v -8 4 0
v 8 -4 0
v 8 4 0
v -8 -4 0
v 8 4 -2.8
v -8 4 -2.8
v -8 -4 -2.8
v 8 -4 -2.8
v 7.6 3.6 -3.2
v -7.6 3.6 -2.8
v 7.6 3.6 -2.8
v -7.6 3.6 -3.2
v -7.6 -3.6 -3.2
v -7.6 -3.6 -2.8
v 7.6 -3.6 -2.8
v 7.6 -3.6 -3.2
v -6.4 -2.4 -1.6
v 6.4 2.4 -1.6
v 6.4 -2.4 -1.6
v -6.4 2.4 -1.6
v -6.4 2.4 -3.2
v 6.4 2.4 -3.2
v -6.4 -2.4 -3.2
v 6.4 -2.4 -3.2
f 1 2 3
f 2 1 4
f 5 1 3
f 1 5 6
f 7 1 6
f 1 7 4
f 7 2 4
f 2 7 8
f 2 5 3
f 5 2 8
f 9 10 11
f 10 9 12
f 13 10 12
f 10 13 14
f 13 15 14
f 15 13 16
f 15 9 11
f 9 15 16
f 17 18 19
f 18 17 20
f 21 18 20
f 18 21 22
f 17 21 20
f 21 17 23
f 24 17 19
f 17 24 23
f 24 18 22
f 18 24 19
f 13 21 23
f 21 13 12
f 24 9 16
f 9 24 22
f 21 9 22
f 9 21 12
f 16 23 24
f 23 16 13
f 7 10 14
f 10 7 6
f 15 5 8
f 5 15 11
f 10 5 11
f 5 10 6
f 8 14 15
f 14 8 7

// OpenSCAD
// file: ../p/box5.scad
use <../lib.scad>
function ldraw_lib__box5() = [
// 0 Box with 5 Faces and All Edges
// 0 Name: box5.dat
// 0 Author: James Jessiman
// 0 !LDRAW_ORG Primitive UPDATE 2012-01
// 0 !LICENSE Licensed under CC BY 4.0 : see CAreadme.txt
// 
// 0 BFC CERTIFY CCW
  [0,"BFC","CERTIFY"],
  [0,"BFC","CCW"],
// 
// 0 !HISTORY 2002-04-03 [sbliss] Modified for BFC compliance
// 0 !HISTORY 2002-04-25 [PTadmin] Official Update 2002-02
// 0 !HISTORY 2007-06-24 [PTadmin] Header formatted for Contributor Agreement
// 0 !HISTORY 2008-07-01 [PTadmin] Official Update 2008-01
// 0 !HISTORY 2012-02-16 [Philo] Changed to CCW
// 0 !HISTORY 2012-03-30 [PTadmin] Official Update 2012-01
// 
// 
// 2 24 1 1 1 -1 1 1
  [2,24,1,1,1,-1,1,1],
// 2 24 -1 1 1 -1 1 -1
  [2,24,-1,1,1,-1,1,-1],
// 2 24 -1 1 -1 1 1 -1
  [2,24,-1,1,-1,1,1,-1],
// 2 24 1 1 -1 1 1 1
  [2,24,1,1,-1,1,1,1],
// 2 24 1 0 1 -1 0 1
  [2,24,1,0,1,-1,0,1],
// 2 24 -1 0 1 -1 0 -1
  [2,24,-1,0,1,-1,0,-1],
// 2 24 -1 0 -1 1 0 -1
  [2,24,-1,0,-1,1,0,-1],
// 2 24 1 0 -1 1 0 1
  [2,24,1,0,-1,1,0,1],
// 2 24 1 0 1 1 1 1
  [2,24,1,0,1,1,1,1],
// 2 24 -1 0 1 -1 1 1
  [2,24,-1,0,1,-1,1,1],
// 2 24 1 0 -1 1 1 -1
  [2,24,1,0,-1,1,1,-1],
// 2 24 -1 0 -1 -1 1 -1
  [2,24,-1,0,-1,-1,1,-1],
// 4 16 -1 1 1 1 1 1 1 1 -1 -1 1 -1
  [4,16,-1,1,1,1,1,1,1,1,-1,-1,1,-1],
// 4 16 -1 1 1 -1 0 1 1 0 1 1 1 1
  [4,16,-1,1,1,-1,0,1,1,0,1,1,1,1],
// 4 16 -1 1 -1 -1 0 -1 -1 0 1 -1 1 1
  [4,16,-1,1,-1,-1,0,-1,-1,0,1,-1,1,1],
// 4 16 1 1 -1 1 0 -1 -1 0 -1 -1 1 -1
  [4,16,1,1,-1,1,0,-1,-1,0,-1,-1,1,-1],
// 4 16 1 1 1 1 0 1 1 0 -1 1 1 -1
  [4,16,1,1,1,1,0,1,1,0,-1,1,1,-1],
];
module ldraw_lib__box5(step=0, col=false, unit=2/5, alt=false, line=0.2, solid=!$preview)
    makepoly(ldraw_lib__box5(), step=step, col=col, unit=unit, alt=alt, line=line, solid=solid);
ldraw_lib__box5(line=0.2);
// file: ../p/box4.scad
use <../lib.scad>
function ldraw_lib__box4() = [
// 0 Box with 4 Faces (2 Parallel Pairs) and All Edges
// 0 Name: box4.dat
// 0 Author: James Jessiman
// 0 !LDRAW_ORG Primitive UPDATE 2012-01
// 0 !LICENSE Licensed under CC BY 4.0 : see CAreadme.txt
// 
// 0 BFC CERTIFY CCW
  [0,"BFC","CERTIFY"],
  [0,"BFC","CCW"],
// 
// 0 !HISTORY 2002-04-03 [sbliss] Modified for BFC compliance
// 0 !HISTORY 2002-04-25 [PTadmin] Official Update 2002-02
// 0 !HISTORY 2007-06-24 [PTadmin] Header formatted for Contributor Agreement
// 0 !HISTORY 2008-07-01 [PTadmin] Official Update 2008-01
// 0 !HISTORY 2012-02-16 [Philo] Changed to CCW
// 0 !HISTORY 2012-03-30 [PTadmin] Official Update 2012-01
// 
// 
// 2 24 1 1 1 -1 1 1
  [2,24,1,1,1,-1,1,1],
// 2 24 -1 1 1 -1 1 -1
  [2,24,-1,1,1,-1,1,-1],
// 2 24 -1 1 -1 1 1 -1
  [2,24,-1,1,-1,1,1,-1],
// 2 24 1 1 -1 1 1 1
  [2,24,1,1,-1,1,1,1],
// 2 24 1 0 1 -1 0 1
  [2,24,1,0,1,-1,0,1],
// 2 24 -1 0 1 -1 0 -1
  [2,24,-1,0,1,-1,0,-1],
// 2 24 -1 0 -1 1 0 -1
  [2,24,-1,0,-1,1,0,-1],
// 2 24 1 0 -1 1 0 1
  [2,24,1,0,-1,1,0,1],
// 2 24 1 0 1 1 1 1
  [2,24,1,0,1,1,1,1],
// 2 24 -1 0 1 -1 1 1
  [2,24,-1,0,1,-1,1,1],
// 2 24 1 0 -1 1 1 -1
  [2,24,1,0,-1,1,1,-1],
// 2 24 -1 0 -1 -1 1 -1
  [2,24,-1,0,-1,-1,1,-1],
// 4 16 -1 1 1 -1 0 1 1 0 1 1 1 1
  [4,16,-1,1,1,-1,0,1,1,0,1,1,1,1],
// 4 16 -1 1 -1 -1 0 -1 -1 0 1 -1 1 1
  [4,16,-1,1,-1,-1,0,-1,-1,0,1,-1,1,1],
// 4 16 1 1 -1 1 0 -1 -1 0 -1 -1 1 -1
  [4,16,1,1,-1,1,0,-1,-1,0,-1,-1,1,-1],
// 4 16 1 1 1 1 0 1 1 0 -1 1 1 -1
  [4,16,1,1,1,1,0,1,1,0,-1,1,1,-1],
];
module ldraw_lib__box4(step=0, col=false, unit=2/5, alt=false, line=0.2, solid=!$preview)
    makepoly(ldraw_lib__box4(), step=step, col=col, unit=unit, alt=alt, line=line, solid=solid);
ldraw_lib__box4(line=0.2);
// file: s/3069bs01.scad
use <../../lib.scad>
use <../../p/box4.scad>
use <../../p/box5.scad>
function ldraw_lib__s__3069bs01() = [
// 0 ~Tile  1 x  2 with Groove without Top Face
// 0 Name: s\3069bs01.dat
// 0 Author: Santeri Piippo [arezey]
// 0 !LDRAW_ORG Subpart UPDATE 2010-02
// 0 !LICENSE Licensed under CC BY 4.0 : see CAreadme.txt
// 
// 0 BFC CERTIFY CCW
  [0,"BFC","CERTIFY"],
  [0,"BFC","CCW"],
// 
// 0 !HISTORY 2010-07-05 [PTadmin] Official Update 2010-02
// 
// 
// 1 16 0 0 0 20 0 0 0 7 0 0 0 10 box4.dat
  [1,16,0,0,0,20,0,0,0,7,0,0,0,10, ldraw_lib__box4()],
// 1 16 0 7 0 19 0 0 0 1 0 0 0 9 box4.dat
  [1,16,0,7,0,19,0,0,0,1,0,0,0,9, ldraw_lib__box4()],
// 0 BFC INVERTNEXT
  [0,"BFC","INVERTNEXT"],
// 1 16 0 8 0 16 0 0 0 -4 0 0 0 6 box5.dat
  [1,16,0,8,0,16,0,0,0,-4,0,0,0,6, ldraw_lib__box5()],
// 4 16 -19 8 9 -16 8 6 -16 8 -6 -19 8 -9
  [4,16,-19,8,9,-16,8,6,-16,8,-6,-19,8,-9],
// 4 16 19 8 -9 16 8 -6 16 8 6 19 8 9
  [4,16,19,8,-9,16,8,-6,16,8,6,19,8,9],
// 4 16 19 8 9 16 8 6 -16 8 6 -19 8 9
  [4,16,19,8,9,16,8,6,-16,8,6,-19,8,9],
// 4 16 -19 8 -9 -16 8 -6 16 8 -6 19 8 -9
  [4,16,-19,8,-9,-16,8,-6,16,8,-6,19,8,-9],
// 4 16 -20 7 10 -19 7 9 -19 7 -9 -20 7 -10
  [4,16,-20,7,10,-19,7,9,-19,7,-9,-20,7,-10],
// 4 16 20 7 -10 19 7 -9 19 7 9 20 7 10
  [4,16,20,7,-10,19,7,-9,19,7,9,20,7,10],
// 4 16 20 7 10 19 7 9 -19 7 9 -20 7 10
  [4,16,20,7,10,19,7,9,-19,7,9,-20,7,10],
// 4 16 -20 7 -10 -19 7 -9 19 7 -9 20 7 -10
  [4,16,-20,7,-10,-19,7,-9,19,7,-9,20,7,-10],
// 0 //
];
module ldraw_lib__s__3069bs01(step=0, col=false, unit=2/5, alt=false, line=0.2, solid=!$preview)
    makepoly(ldraw_lib__s__3069bs01(), step=step, col=col, unit=unit, alt=alt, line=line, solid=solid);
ldraw_lib__s__3069bs01(line=0.2);
// main file
use <../lib.scad>
use <s/3069bs01.scad>
function ldraw_lib__3069b() = [
// 0 Tile  1 x  2 with Groove
// 0 Name: 3069b.dat
// 0 Author: Santeri Piippo [arezey]
// 0 !LDRAW_ORG Part UPDATE 2010-02
// 0 !LICENSE Licensed under CC BY 4.0 : see CAreadme.txt
// 
// 0 BFC CERTIFY CCW
  [0,"BFC","CERTIFY"],
  [0,"BFC","CCW"],
// 
// 0 !KEYWORDS BrickLink 3069
// 
// 0 !HISTORY 2010-07-05 [PTadmin] Official Update 2010-02
// 
// 
// 4 16 20 0 -10 20 0 10 -20 0 10 -20 0 -10
  [4,16,20,0,-10,20,0,10,-20,0,10,-20,0,-10],
// 1 16 0 0 0 1 0 0 0 1 0 0 0 1 s\3069bs01.dat
  [1,16,0,0,0,1,0,0,0,1,0,0,0,1, ldraw_lib__s__3069bs01()],
// 0 //
];
module ldraw_lib__3069b(step=0, col=false, unit=2/5, alt=false, line=0.2, solid=!$preview)
    makepoly(ldraw_lib__3069b(), step=step, col=col, unit=unit, alt=alt, line=line, solid=solid);
ldraw_lib__3069b(line=0.2);
